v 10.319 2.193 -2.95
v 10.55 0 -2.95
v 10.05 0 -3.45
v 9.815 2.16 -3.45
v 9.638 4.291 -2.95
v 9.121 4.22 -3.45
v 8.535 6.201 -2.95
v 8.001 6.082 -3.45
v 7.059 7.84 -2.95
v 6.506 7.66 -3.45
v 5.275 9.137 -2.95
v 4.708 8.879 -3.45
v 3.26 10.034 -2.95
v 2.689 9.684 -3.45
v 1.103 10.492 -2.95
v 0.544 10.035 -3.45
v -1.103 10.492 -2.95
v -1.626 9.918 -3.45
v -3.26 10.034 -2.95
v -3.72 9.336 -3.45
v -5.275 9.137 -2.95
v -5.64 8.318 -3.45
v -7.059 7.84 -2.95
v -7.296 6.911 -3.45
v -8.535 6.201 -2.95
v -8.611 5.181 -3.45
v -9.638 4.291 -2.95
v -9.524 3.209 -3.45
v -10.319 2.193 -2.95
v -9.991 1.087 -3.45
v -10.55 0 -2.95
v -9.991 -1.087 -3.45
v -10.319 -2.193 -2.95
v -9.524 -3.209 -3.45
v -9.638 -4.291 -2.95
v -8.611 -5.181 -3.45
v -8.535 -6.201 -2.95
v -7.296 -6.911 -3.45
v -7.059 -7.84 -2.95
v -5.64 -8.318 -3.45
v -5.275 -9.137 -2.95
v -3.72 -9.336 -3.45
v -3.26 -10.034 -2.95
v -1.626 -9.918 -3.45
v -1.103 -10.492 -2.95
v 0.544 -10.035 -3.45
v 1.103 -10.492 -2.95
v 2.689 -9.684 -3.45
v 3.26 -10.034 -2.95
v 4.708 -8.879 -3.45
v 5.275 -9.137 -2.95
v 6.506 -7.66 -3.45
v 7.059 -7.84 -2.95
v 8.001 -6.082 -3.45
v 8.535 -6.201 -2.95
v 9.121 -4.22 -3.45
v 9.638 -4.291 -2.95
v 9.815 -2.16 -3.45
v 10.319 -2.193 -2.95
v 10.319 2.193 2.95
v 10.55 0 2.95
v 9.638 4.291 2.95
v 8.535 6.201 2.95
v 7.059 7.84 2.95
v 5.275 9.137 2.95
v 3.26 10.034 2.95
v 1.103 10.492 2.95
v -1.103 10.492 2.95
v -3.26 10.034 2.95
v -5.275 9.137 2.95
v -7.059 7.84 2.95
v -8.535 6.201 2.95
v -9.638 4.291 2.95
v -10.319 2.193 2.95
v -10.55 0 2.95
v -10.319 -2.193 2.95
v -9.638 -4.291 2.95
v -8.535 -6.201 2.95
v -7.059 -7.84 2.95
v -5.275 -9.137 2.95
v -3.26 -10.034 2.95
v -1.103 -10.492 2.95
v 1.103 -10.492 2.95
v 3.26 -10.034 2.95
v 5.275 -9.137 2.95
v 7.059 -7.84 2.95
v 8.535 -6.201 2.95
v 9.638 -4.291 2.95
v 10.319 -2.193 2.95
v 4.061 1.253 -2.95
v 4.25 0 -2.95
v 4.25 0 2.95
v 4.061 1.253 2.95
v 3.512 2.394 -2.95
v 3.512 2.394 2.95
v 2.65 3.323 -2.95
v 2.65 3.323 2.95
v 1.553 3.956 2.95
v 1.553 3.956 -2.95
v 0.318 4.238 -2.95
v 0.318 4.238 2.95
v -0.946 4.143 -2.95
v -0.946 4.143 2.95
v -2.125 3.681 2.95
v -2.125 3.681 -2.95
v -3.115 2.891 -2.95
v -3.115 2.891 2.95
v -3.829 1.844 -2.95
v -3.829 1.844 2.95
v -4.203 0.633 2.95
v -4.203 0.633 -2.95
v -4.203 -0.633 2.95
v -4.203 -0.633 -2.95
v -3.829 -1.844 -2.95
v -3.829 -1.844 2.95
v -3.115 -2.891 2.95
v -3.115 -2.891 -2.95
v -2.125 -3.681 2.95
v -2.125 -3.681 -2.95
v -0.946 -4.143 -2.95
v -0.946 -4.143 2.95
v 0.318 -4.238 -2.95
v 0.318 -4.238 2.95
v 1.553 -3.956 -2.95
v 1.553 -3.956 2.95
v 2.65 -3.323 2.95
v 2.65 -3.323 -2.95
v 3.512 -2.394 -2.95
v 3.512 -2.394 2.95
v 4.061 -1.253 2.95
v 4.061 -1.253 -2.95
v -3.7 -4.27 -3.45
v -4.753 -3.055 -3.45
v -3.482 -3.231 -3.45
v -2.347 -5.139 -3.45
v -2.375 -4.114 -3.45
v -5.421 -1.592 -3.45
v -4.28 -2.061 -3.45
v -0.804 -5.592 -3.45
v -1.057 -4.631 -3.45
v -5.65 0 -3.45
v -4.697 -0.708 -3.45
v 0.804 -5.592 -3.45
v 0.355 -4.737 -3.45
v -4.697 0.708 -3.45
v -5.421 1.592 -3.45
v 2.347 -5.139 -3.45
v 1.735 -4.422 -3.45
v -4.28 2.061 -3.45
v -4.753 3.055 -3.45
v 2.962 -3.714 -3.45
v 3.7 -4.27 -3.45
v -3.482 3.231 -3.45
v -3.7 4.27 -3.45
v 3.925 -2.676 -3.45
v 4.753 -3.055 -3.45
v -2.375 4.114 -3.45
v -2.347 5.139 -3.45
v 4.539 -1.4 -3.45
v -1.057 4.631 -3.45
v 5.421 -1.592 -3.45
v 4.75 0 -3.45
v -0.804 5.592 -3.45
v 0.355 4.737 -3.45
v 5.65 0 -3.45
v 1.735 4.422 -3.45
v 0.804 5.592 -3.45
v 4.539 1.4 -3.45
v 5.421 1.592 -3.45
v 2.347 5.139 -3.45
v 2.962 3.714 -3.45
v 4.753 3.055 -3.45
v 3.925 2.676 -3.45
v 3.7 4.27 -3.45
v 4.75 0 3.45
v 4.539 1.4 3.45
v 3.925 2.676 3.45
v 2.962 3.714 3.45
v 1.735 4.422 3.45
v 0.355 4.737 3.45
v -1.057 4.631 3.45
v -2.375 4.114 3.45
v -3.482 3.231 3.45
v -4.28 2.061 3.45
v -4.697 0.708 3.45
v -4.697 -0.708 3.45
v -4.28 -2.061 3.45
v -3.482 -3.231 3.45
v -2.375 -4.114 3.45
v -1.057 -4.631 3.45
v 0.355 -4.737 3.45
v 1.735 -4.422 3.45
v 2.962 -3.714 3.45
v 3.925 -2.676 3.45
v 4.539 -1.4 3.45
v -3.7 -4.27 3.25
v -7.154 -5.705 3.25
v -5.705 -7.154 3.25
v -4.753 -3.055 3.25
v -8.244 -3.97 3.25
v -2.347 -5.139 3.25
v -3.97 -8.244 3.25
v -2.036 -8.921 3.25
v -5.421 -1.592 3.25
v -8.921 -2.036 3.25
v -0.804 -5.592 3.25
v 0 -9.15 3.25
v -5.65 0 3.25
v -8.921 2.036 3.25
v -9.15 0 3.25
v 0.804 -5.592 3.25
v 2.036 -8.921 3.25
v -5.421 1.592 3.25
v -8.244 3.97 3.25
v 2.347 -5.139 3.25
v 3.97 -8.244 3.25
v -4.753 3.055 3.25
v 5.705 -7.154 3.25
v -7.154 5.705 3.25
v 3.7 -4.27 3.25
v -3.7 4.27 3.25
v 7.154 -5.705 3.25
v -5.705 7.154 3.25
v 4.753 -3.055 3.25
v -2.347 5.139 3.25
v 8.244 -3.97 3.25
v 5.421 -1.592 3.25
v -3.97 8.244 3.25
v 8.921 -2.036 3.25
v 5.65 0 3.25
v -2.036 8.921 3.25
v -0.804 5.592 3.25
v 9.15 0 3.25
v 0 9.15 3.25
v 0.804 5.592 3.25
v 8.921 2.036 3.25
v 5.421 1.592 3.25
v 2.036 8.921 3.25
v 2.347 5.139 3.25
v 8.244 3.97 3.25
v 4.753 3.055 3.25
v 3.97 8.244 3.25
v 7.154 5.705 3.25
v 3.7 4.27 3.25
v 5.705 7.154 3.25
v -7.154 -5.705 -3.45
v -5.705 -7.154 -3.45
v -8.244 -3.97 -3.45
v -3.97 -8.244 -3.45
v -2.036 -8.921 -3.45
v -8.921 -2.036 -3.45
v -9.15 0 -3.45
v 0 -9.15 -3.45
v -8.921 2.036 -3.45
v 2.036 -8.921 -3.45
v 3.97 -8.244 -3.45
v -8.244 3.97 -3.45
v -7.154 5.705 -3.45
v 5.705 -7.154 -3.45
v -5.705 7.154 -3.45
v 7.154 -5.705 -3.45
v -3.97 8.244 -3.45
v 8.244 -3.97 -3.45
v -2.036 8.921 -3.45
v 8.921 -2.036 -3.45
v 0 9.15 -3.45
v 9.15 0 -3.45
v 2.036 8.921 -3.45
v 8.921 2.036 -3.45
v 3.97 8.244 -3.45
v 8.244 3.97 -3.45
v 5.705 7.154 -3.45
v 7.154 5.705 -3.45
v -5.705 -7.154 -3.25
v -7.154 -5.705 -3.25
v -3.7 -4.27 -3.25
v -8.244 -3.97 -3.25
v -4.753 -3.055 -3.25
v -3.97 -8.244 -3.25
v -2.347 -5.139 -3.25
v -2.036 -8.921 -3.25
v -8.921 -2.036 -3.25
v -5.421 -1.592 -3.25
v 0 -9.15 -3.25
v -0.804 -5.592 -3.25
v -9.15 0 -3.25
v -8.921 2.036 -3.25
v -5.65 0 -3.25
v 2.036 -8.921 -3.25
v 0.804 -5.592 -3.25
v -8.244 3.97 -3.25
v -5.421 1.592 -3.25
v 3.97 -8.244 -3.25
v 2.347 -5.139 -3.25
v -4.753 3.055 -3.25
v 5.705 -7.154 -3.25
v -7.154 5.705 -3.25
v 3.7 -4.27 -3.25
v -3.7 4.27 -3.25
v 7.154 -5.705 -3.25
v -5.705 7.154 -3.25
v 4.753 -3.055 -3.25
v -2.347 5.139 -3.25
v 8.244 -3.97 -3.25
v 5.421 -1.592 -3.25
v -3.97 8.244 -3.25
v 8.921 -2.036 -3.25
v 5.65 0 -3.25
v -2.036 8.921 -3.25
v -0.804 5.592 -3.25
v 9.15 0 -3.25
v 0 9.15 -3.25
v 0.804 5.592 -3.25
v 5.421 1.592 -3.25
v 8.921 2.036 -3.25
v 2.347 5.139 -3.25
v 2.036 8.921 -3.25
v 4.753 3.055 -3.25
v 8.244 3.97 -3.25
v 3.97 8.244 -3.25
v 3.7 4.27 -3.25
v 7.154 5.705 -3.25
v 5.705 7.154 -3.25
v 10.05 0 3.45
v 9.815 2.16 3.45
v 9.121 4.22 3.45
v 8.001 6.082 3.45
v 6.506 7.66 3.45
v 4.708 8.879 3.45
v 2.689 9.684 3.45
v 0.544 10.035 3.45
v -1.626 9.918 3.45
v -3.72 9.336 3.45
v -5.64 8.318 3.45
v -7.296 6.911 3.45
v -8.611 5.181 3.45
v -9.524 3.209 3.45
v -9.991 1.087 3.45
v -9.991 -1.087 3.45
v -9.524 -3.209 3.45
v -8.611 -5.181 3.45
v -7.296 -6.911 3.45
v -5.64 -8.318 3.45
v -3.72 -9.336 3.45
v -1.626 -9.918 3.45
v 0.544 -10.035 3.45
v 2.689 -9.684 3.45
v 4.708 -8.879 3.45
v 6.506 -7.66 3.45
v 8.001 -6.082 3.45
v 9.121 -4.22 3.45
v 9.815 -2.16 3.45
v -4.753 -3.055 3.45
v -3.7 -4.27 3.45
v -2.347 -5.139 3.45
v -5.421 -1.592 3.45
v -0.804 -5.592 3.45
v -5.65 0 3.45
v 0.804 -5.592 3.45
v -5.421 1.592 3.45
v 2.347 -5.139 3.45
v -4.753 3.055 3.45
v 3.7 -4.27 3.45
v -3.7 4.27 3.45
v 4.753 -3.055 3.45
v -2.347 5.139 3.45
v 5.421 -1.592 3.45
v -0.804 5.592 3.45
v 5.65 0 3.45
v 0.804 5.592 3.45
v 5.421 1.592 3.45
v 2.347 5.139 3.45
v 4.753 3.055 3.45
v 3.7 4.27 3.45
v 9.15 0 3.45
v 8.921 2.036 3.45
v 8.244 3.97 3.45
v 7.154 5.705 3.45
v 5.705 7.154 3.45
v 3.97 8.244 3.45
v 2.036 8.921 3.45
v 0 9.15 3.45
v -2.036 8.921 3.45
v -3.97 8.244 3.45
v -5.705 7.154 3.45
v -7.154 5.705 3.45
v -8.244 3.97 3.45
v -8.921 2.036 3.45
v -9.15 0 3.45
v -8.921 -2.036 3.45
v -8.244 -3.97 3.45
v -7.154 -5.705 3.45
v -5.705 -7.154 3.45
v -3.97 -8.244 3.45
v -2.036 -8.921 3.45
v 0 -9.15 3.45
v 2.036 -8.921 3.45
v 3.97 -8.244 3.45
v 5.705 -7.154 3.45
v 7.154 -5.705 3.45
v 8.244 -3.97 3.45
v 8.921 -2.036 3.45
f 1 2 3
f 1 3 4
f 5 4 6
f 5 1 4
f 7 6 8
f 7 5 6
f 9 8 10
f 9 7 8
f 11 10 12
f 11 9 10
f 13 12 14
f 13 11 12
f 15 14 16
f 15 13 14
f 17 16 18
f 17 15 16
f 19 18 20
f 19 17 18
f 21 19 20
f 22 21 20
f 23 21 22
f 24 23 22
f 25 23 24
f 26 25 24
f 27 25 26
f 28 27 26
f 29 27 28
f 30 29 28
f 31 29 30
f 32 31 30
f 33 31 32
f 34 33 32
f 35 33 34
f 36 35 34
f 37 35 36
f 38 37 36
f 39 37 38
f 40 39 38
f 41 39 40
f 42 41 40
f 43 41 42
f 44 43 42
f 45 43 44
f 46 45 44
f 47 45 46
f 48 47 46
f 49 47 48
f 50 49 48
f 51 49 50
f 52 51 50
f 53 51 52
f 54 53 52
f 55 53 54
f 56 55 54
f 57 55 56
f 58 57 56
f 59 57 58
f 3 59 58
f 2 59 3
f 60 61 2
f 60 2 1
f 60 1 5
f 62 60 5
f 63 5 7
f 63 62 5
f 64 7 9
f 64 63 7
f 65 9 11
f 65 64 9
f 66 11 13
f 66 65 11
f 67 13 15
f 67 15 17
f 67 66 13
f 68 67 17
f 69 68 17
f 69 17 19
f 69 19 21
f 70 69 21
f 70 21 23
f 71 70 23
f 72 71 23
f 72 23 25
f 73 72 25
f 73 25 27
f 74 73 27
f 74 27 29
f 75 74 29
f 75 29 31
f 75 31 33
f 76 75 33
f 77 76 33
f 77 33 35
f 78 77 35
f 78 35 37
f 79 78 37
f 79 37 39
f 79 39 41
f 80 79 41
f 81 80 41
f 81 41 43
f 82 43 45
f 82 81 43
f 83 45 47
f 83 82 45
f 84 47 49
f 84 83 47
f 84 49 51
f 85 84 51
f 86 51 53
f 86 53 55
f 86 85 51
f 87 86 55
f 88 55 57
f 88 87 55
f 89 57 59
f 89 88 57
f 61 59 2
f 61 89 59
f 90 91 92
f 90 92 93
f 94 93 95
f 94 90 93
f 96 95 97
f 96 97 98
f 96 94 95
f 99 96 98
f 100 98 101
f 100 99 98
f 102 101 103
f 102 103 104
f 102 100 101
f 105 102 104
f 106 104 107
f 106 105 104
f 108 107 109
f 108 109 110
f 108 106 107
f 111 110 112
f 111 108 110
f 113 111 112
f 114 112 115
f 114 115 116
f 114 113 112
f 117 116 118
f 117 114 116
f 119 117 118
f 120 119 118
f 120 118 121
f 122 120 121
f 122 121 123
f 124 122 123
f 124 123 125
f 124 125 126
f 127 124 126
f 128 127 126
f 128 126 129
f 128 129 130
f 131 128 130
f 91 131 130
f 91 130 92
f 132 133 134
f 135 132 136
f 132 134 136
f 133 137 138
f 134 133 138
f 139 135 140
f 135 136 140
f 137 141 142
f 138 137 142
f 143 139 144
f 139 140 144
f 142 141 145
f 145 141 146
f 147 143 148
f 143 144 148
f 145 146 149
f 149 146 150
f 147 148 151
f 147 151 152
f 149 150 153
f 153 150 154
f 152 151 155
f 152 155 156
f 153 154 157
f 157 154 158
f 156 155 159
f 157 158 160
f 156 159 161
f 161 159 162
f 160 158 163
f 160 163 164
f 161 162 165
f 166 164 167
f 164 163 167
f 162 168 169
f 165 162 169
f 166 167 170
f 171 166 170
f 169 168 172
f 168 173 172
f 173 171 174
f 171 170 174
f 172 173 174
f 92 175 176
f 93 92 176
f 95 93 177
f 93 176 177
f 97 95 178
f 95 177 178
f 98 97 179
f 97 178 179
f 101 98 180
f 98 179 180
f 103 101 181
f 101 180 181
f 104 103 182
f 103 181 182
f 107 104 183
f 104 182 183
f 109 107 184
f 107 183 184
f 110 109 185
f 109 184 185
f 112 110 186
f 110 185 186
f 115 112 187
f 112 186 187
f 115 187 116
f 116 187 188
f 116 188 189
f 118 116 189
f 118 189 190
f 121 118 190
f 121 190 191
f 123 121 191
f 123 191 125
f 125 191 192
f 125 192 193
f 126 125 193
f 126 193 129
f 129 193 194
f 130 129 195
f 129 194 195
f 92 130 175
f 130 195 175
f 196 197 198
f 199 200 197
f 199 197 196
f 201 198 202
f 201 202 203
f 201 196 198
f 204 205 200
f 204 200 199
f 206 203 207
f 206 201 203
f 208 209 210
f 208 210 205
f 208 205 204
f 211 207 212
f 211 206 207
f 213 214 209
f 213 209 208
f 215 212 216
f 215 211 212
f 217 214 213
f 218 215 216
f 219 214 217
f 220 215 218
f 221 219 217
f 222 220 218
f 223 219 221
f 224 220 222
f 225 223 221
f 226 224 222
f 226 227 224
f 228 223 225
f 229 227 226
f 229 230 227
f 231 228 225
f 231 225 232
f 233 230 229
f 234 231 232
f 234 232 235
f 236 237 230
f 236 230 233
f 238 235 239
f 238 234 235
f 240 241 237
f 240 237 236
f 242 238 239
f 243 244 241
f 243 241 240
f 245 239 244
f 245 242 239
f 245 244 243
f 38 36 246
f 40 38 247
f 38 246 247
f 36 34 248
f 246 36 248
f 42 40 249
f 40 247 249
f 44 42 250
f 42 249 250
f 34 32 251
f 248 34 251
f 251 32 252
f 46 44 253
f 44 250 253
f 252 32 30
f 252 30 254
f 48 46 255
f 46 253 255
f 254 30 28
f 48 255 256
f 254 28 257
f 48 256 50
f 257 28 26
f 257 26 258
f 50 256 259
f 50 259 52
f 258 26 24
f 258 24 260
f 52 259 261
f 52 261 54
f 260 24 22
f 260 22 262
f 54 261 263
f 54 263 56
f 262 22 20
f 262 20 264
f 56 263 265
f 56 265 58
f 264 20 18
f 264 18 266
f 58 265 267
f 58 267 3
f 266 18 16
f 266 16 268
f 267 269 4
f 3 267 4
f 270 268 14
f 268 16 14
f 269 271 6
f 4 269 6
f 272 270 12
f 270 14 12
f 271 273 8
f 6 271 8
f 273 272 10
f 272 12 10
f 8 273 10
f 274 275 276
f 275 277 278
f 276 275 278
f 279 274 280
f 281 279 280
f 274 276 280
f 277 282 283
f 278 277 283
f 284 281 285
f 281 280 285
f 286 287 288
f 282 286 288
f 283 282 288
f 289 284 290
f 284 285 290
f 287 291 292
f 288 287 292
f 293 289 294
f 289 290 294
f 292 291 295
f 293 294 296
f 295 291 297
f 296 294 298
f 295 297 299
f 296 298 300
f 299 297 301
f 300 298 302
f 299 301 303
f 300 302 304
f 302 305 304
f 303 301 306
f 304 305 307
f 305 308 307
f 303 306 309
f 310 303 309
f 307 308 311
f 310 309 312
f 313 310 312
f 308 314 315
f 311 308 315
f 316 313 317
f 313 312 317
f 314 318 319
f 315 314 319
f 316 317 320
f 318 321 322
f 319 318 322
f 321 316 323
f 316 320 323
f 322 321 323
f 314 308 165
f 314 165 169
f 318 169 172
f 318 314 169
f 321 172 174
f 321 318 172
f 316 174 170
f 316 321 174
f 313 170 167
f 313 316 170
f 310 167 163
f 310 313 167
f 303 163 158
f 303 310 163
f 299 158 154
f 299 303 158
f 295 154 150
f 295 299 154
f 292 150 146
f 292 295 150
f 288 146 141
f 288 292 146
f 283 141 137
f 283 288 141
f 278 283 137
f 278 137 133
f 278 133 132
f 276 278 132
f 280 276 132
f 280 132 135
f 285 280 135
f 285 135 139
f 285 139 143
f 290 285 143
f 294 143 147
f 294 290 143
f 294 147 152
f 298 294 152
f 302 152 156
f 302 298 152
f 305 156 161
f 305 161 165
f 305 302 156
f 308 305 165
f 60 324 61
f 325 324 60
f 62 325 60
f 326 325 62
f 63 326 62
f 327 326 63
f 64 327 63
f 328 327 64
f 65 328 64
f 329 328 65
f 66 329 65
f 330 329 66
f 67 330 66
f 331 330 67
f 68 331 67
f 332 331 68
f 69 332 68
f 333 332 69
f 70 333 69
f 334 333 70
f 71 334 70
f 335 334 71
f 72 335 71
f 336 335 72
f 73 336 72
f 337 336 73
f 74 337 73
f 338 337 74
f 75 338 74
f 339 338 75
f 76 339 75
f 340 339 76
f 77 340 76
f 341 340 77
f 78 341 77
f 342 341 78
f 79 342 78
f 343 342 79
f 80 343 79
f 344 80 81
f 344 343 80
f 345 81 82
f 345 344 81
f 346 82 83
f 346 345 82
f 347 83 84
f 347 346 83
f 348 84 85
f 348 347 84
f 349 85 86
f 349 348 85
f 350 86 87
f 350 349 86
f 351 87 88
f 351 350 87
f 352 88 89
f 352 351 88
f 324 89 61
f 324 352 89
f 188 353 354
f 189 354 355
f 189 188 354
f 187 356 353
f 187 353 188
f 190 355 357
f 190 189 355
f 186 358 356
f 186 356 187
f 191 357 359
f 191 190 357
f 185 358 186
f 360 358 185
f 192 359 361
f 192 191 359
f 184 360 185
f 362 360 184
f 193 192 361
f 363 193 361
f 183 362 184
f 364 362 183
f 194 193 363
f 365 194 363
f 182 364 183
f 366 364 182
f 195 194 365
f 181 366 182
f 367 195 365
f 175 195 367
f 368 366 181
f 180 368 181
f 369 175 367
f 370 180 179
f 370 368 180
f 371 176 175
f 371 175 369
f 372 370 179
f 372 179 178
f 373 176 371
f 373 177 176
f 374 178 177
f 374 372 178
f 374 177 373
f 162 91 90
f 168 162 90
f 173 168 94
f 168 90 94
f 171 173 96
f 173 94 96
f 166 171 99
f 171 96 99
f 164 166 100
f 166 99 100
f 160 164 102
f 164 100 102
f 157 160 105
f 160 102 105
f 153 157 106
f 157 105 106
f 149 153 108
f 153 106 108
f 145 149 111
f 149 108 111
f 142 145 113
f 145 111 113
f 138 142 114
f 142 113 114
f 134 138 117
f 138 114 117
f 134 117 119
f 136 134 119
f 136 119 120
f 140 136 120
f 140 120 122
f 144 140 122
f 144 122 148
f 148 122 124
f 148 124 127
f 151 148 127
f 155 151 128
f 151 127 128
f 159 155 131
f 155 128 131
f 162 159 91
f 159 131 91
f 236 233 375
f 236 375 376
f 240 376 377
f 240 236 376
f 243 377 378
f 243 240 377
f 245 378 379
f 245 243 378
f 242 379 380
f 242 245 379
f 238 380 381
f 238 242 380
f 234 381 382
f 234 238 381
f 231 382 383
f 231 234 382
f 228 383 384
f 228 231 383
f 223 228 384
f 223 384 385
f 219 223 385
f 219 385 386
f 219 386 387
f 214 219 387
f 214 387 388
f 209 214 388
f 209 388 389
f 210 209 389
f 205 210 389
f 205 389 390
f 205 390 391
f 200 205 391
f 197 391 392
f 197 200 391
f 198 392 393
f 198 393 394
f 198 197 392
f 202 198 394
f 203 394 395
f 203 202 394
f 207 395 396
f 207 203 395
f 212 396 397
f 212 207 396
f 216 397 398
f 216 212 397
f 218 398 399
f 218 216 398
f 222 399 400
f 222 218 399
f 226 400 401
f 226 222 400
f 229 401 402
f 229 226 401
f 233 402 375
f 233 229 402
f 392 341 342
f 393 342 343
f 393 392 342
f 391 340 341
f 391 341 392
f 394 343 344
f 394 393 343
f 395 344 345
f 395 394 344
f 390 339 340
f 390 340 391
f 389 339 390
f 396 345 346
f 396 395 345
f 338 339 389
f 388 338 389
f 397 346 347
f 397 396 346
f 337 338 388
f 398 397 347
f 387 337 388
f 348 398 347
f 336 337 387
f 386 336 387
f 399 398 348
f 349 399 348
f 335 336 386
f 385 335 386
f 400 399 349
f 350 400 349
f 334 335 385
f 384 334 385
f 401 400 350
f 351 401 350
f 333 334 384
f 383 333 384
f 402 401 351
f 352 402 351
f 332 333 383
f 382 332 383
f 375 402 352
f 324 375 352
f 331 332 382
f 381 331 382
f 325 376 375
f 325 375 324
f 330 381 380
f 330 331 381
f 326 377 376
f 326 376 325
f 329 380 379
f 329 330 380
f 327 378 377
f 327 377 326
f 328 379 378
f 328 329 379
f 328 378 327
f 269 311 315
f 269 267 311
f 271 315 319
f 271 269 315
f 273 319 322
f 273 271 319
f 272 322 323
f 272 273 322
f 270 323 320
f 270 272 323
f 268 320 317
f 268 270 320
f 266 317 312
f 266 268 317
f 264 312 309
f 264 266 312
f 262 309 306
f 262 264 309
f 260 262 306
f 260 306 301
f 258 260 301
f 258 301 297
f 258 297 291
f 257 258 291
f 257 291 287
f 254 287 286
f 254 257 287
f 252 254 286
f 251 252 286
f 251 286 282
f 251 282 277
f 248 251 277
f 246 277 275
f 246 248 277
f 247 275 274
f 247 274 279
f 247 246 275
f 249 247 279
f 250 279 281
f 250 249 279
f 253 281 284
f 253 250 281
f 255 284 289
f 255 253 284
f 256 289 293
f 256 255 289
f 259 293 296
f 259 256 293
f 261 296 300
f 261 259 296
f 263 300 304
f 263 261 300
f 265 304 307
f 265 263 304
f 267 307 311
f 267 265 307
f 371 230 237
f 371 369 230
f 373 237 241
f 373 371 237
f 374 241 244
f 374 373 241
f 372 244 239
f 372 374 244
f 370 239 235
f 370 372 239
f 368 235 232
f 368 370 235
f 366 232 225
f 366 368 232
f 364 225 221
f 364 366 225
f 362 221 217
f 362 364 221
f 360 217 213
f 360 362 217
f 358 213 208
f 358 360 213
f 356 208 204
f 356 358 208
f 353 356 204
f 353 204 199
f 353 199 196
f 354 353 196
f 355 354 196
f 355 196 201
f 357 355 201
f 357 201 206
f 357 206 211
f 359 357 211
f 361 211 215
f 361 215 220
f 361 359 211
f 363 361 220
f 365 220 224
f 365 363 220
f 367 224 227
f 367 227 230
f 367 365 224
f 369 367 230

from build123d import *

# Parameters (mm, degrees)
ESQUISSE1_R        = 10.55
ESQUISSE1_R_2      = 9.15
BOSS_EXTRU_1_DEPTH = 3.45
ESQUISSE1_3_R      = 5.65
ESQUISSE1_3_R_2    = 4.25
BOSS_EXTRU_2_DEPTH = 3.45
ESQUISSE1_4_R      = 9.15
ESQUISSE1_4_R_2    = 5.65
BOSS_EXTRU_3_DEPTH = 3.25
CHANFREIN1_SIZE    = 0.5


with BuildPart() as part:
    # Esquisse1 → Boss.-Extru.1 (new body, symmetric)
    with BuildSketch(Plane.XY):
        Circle(ESQUISSE1_R)
        Circle(ESQUISSE1_R_2, mode=Mode.SUBTRACT)
    extrude(amount=BOSS_EXTRU_1_DEPTH, both=True)



with BuildPart() as body_2:
    # Esquisse1<3> → Boss.-Extru.2 (new body, symmetric)
    with BuildSketch(Plane.XY):
        Circle(ESQUISSE1_3_R)
        Circle(ESQUISSE1_3_R_2, mode=Mode.SUBTRACT)
    extrude(amount=BOSS_EXTRU_2_DEPTH, both=True)


with BuildPart() as part_1:
    add(part.part)

    add(body_2.part)  # Boss.-Extru.3 merges body 2
    # Esquisse1<4> → Boss.-Extru.3 (add, symmetric)
    with BuildSketch(Plane.XY):
        Circle(ESQUISSE1_4_R)
        Circle(ESQUISSE1_4_R_2, mode=Mode.SUBTRACT)
    extrude(amount=BOSS_EXTRU_3_DEPTH, both=True)

    # Chanfrein1
    chanfrein1_edges = [part_1.edges().sort_by_distance(p)[0] for p in [
        (-4.25, 0, -3.45),
        (-4.25, 0, 3.45),
        (-10.55, 0, -3.45),
        (-10.55, 0, 3.45),
    ]]
    chamfer(chanfrein1_edges, length=CHANFREIN1_SIZE)


solid = part_1.part
